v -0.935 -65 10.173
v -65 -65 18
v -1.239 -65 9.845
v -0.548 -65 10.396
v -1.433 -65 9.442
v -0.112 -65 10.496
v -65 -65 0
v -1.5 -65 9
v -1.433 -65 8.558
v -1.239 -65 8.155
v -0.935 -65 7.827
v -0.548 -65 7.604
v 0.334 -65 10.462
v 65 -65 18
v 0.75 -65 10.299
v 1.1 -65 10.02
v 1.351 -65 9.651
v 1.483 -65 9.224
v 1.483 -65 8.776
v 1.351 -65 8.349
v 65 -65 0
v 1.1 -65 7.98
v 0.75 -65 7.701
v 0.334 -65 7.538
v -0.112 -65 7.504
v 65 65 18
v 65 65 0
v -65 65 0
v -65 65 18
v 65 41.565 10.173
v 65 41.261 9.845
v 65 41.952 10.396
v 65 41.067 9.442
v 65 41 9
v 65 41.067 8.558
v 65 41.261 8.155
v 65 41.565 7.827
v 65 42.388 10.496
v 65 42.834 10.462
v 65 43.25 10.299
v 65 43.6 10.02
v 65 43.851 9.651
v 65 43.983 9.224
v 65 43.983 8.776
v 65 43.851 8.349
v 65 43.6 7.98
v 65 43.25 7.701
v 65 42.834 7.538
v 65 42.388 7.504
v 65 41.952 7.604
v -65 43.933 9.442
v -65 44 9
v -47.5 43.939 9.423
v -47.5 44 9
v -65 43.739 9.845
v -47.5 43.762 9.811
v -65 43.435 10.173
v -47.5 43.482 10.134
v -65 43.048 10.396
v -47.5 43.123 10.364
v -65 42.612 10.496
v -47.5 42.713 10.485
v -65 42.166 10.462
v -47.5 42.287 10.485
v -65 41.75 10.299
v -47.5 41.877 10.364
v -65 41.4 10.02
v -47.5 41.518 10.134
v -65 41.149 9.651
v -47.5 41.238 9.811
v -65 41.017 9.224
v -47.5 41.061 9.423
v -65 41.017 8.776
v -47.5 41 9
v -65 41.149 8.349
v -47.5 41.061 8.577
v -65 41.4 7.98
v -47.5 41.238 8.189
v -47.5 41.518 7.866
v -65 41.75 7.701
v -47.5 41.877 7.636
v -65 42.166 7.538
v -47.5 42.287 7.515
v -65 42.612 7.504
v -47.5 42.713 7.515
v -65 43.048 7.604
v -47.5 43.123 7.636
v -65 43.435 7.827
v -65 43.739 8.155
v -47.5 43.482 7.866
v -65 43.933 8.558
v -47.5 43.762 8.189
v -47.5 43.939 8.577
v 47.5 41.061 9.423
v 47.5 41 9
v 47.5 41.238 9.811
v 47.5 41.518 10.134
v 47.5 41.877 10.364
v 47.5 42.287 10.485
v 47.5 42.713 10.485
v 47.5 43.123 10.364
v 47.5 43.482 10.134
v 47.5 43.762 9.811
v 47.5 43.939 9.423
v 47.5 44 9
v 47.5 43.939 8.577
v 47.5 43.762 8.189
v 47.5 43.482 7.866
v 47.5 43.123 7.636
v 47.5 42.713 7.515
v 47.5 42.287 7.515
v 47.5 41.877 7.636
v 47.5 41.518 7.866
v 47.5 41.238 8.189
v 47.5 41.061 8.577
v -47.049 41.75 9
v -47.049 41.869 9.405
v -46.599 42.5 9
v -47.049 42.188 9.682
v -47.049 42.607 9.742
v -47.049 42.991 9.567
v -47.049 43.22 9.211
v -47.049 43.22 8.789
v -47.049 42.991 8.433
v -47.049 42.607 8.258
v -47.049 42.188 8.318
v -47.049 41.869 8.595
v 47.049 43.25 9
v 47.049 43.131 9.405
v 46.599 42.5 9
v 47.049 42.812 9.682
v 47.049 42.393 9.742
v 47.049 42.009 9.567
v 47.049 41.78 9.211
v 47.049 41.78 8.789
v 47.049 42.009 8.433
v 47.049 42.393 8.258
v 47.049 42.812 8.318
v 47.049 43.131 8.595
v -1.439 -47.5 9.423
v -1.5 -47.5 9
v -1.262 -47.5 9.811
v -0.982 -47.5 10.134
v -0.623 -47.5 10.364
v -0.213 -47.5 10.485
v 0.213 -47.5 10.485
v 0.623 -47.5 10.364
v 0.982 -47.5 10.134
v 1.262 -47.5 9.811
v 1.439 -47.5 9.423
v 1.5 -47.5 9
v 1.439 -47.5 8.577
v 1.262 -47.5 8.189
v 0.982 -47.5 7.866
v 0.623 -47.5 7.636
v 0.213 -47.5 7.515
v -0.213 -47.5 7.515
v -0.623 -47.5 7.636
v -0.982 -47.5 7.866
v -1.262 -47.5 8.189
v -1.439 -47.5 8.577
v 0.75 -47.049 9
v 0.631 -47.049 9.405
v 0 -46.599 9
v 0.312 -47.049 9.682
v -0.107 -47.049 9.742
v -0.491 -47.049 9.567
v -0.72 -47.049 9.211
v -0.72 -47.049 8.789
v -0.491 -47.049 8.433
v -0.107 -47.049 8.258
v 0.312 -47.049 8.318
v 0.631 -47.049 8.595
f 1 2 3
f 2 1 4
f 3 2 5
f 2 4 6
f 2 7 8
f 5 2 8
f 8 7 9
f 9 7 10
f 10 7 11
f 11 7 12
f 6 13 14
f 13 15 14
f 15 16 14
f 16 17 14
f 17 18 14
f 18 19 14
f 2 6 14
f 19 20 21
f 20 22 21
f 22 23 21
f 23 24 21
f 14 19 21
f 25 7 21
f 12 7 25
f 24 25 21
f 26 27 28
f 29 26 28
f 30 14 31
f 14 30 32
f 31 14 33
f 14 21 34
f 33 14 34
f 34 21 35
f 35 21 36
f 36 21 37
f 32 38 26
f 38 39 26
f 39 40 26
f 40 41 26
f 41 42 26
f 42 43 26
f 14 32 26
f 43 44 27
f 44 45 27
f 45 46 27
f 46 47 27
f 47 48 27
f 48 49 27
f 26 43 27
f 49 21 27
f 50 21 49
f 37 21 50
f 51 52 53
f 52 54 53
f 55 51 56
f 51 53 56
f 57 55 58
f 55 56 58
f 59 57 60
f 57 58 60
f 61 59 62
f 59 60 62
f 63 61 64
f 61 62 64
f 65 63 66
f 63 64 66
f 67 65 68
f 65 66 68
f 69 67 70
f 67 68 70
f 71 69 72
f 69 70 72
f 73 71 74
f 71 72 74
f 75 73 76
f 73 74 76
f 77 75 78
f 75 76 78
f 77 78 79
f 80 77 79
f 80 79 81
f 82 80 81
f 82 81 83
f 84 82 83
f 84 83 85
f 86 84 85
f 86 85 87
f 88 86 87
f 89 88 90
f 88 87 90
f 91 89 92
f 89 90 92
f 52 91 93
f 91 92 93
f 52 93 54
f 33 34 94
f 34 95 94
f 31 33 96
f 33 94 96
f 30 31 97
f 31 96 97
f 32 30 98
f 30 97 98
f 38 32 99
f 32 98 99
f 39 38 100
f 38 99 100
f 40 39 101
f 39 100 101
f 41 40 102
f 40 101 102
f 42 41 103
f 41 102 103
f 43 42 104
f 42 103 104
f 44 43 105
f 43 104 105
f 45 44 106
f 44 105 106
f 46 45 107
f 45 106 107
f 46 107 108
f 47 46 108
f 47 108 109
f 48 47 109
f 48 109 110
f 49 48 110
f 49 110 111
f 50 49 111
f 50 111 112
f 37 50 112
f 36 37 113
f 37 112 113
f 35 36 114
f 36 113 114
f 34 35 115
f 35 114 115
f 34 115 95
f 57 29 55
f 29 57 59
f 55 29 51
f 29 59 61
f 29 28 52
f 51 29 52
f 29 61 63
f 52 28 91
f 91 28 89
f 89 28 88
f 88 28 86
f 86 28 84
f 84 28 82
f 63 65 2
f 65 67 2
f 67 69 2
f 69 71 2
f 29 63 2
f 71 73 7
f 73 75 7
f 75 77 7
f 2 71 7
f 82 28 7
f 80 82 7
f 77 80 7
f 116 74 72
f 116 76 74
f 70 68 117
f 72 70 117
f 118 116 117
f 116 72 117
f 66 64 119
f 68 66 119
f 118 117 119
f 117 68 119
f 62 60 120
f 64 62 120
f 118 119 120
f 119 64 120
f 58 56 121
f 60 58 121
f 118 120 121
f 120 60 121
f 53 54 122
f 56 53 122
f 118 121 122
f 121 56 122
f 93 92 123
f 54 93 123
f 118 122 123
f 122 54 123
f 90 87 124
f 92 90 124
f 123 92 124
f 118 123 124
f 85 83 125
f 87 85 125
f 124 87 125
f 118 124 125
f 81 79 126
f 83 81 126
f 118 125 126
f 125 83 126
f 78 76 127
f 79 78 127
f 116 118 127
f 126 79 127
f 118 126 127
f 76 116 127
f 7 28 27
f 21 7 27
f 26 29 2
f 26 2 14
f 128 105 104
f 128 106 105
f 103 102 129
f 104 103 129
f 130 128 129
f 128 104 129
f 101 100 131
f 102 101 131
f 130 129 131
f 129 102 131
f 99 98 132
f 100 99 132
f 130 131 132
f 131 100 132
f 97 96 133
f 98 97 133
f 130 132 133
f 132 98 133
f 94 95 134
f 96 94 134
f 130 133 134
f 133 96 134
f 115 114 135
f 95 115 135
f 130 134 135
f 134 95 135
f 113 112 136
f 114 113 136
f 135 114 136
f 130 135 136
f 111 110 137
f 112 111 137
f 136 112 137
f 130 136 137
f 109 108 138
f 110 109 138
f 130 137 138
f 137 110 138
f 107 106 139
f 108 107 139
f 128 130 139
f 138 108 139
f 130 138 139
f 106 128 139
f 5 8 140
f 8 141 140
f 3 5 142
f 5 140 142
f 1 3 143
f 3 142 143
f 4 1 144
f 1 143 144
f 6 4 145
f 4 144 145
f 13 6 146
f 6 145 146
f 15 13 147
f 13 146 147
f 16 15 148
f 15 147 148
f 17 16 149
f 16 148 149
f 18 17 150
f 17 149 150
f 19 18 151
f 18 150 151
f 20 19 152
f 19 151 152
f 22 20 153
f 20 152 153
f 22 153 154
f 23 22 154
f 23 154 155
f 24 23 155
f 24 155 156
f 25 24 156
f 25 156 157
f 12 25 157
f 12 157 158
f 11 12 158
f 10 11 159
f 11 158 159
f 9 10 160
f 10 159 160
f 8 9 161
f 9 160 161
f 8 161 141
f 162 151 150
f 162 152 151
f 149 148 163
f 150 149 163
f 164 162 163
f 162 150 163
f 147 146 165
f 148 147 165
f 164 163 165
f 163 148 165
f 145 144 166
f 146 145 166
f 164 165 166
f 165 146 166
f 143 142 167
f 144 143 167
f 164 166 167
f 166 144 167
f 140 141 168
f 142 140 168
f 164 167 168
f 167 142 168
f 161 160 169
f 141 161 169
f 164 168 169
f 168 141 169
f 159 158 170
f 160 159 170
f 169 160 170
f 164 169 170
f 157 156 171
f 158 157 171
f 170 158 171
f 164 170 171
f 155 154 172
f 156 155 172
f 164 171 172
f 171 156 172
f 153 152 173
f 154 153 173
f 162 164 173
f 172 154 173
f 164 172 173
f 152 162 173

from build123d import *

# Parameters (mm, degrees)
F1_DEPTH = 18
F3_D     = 3
F3_DEPTH = 17.5
F3_TIP   = 0.9012909285
F5_D     = 3
F5_DEPTH = 17.5
F5_TIP   = 0.9012909285
F7_D     = 3
F7_DEPTH = 17.5
F7_TIP   = 0.9012909285


with BuildPart() as f1:
    # F0 (on Top) → F1 (new body)
    with BuildSketch(Plane.XY):
        Polygon((65, 65), (55, 65), (-55, 65), (-65, 65), (-65, 55), (-65, -55), (-65, -65), (-55, -65), (55, -65), (65, -65), (65, -55), (65, 55), align=None)
    extrude(amount=F1_DEPTH)

    # F3
    with Locations(Plane.XZ.offset(65)):
        with Locations((0, 9)):
            Hole(F3_D / 2, depth=F3_DEPTH)
            with Locations((0, 0, -(F3_DEPTH + F3_TIP / 2))):  # 118° drill point
                Cone(0, F3_D / 2, F3_TIP, mode=Mode.SUBTRACT)

    # F5
    with Locations(Plane.YZ.offset(65)):
        with Locations((42.5, 9)):
            Hole(F5_D / 2, depth=F5_DEPTH)
            with Locations((0, 0, -(F5_DEPTH + F5_TIP / 2))):  # 118° drill point
                Cone(0, F5_D / 2, F5_TIP, mode=Mode.SUBTRACT)

    # F7
    with Locations(Plane(origin=(-65, 0, 0), x_dir=(0, -1, 0), z_dir=(-1, 0, 0))):
        with Locations((-42.5, 9)):
            Hole(F7_D / 2, depth=F7_DEPTH)
            with Locations((0, 0, -(F7_DEPTH + F7_TIP / 2))):  # 118° drill point
                Cone(0, F7_D / 2, F7_TIP, mode=Mode.SUBTRACT)


solid = f1.part
